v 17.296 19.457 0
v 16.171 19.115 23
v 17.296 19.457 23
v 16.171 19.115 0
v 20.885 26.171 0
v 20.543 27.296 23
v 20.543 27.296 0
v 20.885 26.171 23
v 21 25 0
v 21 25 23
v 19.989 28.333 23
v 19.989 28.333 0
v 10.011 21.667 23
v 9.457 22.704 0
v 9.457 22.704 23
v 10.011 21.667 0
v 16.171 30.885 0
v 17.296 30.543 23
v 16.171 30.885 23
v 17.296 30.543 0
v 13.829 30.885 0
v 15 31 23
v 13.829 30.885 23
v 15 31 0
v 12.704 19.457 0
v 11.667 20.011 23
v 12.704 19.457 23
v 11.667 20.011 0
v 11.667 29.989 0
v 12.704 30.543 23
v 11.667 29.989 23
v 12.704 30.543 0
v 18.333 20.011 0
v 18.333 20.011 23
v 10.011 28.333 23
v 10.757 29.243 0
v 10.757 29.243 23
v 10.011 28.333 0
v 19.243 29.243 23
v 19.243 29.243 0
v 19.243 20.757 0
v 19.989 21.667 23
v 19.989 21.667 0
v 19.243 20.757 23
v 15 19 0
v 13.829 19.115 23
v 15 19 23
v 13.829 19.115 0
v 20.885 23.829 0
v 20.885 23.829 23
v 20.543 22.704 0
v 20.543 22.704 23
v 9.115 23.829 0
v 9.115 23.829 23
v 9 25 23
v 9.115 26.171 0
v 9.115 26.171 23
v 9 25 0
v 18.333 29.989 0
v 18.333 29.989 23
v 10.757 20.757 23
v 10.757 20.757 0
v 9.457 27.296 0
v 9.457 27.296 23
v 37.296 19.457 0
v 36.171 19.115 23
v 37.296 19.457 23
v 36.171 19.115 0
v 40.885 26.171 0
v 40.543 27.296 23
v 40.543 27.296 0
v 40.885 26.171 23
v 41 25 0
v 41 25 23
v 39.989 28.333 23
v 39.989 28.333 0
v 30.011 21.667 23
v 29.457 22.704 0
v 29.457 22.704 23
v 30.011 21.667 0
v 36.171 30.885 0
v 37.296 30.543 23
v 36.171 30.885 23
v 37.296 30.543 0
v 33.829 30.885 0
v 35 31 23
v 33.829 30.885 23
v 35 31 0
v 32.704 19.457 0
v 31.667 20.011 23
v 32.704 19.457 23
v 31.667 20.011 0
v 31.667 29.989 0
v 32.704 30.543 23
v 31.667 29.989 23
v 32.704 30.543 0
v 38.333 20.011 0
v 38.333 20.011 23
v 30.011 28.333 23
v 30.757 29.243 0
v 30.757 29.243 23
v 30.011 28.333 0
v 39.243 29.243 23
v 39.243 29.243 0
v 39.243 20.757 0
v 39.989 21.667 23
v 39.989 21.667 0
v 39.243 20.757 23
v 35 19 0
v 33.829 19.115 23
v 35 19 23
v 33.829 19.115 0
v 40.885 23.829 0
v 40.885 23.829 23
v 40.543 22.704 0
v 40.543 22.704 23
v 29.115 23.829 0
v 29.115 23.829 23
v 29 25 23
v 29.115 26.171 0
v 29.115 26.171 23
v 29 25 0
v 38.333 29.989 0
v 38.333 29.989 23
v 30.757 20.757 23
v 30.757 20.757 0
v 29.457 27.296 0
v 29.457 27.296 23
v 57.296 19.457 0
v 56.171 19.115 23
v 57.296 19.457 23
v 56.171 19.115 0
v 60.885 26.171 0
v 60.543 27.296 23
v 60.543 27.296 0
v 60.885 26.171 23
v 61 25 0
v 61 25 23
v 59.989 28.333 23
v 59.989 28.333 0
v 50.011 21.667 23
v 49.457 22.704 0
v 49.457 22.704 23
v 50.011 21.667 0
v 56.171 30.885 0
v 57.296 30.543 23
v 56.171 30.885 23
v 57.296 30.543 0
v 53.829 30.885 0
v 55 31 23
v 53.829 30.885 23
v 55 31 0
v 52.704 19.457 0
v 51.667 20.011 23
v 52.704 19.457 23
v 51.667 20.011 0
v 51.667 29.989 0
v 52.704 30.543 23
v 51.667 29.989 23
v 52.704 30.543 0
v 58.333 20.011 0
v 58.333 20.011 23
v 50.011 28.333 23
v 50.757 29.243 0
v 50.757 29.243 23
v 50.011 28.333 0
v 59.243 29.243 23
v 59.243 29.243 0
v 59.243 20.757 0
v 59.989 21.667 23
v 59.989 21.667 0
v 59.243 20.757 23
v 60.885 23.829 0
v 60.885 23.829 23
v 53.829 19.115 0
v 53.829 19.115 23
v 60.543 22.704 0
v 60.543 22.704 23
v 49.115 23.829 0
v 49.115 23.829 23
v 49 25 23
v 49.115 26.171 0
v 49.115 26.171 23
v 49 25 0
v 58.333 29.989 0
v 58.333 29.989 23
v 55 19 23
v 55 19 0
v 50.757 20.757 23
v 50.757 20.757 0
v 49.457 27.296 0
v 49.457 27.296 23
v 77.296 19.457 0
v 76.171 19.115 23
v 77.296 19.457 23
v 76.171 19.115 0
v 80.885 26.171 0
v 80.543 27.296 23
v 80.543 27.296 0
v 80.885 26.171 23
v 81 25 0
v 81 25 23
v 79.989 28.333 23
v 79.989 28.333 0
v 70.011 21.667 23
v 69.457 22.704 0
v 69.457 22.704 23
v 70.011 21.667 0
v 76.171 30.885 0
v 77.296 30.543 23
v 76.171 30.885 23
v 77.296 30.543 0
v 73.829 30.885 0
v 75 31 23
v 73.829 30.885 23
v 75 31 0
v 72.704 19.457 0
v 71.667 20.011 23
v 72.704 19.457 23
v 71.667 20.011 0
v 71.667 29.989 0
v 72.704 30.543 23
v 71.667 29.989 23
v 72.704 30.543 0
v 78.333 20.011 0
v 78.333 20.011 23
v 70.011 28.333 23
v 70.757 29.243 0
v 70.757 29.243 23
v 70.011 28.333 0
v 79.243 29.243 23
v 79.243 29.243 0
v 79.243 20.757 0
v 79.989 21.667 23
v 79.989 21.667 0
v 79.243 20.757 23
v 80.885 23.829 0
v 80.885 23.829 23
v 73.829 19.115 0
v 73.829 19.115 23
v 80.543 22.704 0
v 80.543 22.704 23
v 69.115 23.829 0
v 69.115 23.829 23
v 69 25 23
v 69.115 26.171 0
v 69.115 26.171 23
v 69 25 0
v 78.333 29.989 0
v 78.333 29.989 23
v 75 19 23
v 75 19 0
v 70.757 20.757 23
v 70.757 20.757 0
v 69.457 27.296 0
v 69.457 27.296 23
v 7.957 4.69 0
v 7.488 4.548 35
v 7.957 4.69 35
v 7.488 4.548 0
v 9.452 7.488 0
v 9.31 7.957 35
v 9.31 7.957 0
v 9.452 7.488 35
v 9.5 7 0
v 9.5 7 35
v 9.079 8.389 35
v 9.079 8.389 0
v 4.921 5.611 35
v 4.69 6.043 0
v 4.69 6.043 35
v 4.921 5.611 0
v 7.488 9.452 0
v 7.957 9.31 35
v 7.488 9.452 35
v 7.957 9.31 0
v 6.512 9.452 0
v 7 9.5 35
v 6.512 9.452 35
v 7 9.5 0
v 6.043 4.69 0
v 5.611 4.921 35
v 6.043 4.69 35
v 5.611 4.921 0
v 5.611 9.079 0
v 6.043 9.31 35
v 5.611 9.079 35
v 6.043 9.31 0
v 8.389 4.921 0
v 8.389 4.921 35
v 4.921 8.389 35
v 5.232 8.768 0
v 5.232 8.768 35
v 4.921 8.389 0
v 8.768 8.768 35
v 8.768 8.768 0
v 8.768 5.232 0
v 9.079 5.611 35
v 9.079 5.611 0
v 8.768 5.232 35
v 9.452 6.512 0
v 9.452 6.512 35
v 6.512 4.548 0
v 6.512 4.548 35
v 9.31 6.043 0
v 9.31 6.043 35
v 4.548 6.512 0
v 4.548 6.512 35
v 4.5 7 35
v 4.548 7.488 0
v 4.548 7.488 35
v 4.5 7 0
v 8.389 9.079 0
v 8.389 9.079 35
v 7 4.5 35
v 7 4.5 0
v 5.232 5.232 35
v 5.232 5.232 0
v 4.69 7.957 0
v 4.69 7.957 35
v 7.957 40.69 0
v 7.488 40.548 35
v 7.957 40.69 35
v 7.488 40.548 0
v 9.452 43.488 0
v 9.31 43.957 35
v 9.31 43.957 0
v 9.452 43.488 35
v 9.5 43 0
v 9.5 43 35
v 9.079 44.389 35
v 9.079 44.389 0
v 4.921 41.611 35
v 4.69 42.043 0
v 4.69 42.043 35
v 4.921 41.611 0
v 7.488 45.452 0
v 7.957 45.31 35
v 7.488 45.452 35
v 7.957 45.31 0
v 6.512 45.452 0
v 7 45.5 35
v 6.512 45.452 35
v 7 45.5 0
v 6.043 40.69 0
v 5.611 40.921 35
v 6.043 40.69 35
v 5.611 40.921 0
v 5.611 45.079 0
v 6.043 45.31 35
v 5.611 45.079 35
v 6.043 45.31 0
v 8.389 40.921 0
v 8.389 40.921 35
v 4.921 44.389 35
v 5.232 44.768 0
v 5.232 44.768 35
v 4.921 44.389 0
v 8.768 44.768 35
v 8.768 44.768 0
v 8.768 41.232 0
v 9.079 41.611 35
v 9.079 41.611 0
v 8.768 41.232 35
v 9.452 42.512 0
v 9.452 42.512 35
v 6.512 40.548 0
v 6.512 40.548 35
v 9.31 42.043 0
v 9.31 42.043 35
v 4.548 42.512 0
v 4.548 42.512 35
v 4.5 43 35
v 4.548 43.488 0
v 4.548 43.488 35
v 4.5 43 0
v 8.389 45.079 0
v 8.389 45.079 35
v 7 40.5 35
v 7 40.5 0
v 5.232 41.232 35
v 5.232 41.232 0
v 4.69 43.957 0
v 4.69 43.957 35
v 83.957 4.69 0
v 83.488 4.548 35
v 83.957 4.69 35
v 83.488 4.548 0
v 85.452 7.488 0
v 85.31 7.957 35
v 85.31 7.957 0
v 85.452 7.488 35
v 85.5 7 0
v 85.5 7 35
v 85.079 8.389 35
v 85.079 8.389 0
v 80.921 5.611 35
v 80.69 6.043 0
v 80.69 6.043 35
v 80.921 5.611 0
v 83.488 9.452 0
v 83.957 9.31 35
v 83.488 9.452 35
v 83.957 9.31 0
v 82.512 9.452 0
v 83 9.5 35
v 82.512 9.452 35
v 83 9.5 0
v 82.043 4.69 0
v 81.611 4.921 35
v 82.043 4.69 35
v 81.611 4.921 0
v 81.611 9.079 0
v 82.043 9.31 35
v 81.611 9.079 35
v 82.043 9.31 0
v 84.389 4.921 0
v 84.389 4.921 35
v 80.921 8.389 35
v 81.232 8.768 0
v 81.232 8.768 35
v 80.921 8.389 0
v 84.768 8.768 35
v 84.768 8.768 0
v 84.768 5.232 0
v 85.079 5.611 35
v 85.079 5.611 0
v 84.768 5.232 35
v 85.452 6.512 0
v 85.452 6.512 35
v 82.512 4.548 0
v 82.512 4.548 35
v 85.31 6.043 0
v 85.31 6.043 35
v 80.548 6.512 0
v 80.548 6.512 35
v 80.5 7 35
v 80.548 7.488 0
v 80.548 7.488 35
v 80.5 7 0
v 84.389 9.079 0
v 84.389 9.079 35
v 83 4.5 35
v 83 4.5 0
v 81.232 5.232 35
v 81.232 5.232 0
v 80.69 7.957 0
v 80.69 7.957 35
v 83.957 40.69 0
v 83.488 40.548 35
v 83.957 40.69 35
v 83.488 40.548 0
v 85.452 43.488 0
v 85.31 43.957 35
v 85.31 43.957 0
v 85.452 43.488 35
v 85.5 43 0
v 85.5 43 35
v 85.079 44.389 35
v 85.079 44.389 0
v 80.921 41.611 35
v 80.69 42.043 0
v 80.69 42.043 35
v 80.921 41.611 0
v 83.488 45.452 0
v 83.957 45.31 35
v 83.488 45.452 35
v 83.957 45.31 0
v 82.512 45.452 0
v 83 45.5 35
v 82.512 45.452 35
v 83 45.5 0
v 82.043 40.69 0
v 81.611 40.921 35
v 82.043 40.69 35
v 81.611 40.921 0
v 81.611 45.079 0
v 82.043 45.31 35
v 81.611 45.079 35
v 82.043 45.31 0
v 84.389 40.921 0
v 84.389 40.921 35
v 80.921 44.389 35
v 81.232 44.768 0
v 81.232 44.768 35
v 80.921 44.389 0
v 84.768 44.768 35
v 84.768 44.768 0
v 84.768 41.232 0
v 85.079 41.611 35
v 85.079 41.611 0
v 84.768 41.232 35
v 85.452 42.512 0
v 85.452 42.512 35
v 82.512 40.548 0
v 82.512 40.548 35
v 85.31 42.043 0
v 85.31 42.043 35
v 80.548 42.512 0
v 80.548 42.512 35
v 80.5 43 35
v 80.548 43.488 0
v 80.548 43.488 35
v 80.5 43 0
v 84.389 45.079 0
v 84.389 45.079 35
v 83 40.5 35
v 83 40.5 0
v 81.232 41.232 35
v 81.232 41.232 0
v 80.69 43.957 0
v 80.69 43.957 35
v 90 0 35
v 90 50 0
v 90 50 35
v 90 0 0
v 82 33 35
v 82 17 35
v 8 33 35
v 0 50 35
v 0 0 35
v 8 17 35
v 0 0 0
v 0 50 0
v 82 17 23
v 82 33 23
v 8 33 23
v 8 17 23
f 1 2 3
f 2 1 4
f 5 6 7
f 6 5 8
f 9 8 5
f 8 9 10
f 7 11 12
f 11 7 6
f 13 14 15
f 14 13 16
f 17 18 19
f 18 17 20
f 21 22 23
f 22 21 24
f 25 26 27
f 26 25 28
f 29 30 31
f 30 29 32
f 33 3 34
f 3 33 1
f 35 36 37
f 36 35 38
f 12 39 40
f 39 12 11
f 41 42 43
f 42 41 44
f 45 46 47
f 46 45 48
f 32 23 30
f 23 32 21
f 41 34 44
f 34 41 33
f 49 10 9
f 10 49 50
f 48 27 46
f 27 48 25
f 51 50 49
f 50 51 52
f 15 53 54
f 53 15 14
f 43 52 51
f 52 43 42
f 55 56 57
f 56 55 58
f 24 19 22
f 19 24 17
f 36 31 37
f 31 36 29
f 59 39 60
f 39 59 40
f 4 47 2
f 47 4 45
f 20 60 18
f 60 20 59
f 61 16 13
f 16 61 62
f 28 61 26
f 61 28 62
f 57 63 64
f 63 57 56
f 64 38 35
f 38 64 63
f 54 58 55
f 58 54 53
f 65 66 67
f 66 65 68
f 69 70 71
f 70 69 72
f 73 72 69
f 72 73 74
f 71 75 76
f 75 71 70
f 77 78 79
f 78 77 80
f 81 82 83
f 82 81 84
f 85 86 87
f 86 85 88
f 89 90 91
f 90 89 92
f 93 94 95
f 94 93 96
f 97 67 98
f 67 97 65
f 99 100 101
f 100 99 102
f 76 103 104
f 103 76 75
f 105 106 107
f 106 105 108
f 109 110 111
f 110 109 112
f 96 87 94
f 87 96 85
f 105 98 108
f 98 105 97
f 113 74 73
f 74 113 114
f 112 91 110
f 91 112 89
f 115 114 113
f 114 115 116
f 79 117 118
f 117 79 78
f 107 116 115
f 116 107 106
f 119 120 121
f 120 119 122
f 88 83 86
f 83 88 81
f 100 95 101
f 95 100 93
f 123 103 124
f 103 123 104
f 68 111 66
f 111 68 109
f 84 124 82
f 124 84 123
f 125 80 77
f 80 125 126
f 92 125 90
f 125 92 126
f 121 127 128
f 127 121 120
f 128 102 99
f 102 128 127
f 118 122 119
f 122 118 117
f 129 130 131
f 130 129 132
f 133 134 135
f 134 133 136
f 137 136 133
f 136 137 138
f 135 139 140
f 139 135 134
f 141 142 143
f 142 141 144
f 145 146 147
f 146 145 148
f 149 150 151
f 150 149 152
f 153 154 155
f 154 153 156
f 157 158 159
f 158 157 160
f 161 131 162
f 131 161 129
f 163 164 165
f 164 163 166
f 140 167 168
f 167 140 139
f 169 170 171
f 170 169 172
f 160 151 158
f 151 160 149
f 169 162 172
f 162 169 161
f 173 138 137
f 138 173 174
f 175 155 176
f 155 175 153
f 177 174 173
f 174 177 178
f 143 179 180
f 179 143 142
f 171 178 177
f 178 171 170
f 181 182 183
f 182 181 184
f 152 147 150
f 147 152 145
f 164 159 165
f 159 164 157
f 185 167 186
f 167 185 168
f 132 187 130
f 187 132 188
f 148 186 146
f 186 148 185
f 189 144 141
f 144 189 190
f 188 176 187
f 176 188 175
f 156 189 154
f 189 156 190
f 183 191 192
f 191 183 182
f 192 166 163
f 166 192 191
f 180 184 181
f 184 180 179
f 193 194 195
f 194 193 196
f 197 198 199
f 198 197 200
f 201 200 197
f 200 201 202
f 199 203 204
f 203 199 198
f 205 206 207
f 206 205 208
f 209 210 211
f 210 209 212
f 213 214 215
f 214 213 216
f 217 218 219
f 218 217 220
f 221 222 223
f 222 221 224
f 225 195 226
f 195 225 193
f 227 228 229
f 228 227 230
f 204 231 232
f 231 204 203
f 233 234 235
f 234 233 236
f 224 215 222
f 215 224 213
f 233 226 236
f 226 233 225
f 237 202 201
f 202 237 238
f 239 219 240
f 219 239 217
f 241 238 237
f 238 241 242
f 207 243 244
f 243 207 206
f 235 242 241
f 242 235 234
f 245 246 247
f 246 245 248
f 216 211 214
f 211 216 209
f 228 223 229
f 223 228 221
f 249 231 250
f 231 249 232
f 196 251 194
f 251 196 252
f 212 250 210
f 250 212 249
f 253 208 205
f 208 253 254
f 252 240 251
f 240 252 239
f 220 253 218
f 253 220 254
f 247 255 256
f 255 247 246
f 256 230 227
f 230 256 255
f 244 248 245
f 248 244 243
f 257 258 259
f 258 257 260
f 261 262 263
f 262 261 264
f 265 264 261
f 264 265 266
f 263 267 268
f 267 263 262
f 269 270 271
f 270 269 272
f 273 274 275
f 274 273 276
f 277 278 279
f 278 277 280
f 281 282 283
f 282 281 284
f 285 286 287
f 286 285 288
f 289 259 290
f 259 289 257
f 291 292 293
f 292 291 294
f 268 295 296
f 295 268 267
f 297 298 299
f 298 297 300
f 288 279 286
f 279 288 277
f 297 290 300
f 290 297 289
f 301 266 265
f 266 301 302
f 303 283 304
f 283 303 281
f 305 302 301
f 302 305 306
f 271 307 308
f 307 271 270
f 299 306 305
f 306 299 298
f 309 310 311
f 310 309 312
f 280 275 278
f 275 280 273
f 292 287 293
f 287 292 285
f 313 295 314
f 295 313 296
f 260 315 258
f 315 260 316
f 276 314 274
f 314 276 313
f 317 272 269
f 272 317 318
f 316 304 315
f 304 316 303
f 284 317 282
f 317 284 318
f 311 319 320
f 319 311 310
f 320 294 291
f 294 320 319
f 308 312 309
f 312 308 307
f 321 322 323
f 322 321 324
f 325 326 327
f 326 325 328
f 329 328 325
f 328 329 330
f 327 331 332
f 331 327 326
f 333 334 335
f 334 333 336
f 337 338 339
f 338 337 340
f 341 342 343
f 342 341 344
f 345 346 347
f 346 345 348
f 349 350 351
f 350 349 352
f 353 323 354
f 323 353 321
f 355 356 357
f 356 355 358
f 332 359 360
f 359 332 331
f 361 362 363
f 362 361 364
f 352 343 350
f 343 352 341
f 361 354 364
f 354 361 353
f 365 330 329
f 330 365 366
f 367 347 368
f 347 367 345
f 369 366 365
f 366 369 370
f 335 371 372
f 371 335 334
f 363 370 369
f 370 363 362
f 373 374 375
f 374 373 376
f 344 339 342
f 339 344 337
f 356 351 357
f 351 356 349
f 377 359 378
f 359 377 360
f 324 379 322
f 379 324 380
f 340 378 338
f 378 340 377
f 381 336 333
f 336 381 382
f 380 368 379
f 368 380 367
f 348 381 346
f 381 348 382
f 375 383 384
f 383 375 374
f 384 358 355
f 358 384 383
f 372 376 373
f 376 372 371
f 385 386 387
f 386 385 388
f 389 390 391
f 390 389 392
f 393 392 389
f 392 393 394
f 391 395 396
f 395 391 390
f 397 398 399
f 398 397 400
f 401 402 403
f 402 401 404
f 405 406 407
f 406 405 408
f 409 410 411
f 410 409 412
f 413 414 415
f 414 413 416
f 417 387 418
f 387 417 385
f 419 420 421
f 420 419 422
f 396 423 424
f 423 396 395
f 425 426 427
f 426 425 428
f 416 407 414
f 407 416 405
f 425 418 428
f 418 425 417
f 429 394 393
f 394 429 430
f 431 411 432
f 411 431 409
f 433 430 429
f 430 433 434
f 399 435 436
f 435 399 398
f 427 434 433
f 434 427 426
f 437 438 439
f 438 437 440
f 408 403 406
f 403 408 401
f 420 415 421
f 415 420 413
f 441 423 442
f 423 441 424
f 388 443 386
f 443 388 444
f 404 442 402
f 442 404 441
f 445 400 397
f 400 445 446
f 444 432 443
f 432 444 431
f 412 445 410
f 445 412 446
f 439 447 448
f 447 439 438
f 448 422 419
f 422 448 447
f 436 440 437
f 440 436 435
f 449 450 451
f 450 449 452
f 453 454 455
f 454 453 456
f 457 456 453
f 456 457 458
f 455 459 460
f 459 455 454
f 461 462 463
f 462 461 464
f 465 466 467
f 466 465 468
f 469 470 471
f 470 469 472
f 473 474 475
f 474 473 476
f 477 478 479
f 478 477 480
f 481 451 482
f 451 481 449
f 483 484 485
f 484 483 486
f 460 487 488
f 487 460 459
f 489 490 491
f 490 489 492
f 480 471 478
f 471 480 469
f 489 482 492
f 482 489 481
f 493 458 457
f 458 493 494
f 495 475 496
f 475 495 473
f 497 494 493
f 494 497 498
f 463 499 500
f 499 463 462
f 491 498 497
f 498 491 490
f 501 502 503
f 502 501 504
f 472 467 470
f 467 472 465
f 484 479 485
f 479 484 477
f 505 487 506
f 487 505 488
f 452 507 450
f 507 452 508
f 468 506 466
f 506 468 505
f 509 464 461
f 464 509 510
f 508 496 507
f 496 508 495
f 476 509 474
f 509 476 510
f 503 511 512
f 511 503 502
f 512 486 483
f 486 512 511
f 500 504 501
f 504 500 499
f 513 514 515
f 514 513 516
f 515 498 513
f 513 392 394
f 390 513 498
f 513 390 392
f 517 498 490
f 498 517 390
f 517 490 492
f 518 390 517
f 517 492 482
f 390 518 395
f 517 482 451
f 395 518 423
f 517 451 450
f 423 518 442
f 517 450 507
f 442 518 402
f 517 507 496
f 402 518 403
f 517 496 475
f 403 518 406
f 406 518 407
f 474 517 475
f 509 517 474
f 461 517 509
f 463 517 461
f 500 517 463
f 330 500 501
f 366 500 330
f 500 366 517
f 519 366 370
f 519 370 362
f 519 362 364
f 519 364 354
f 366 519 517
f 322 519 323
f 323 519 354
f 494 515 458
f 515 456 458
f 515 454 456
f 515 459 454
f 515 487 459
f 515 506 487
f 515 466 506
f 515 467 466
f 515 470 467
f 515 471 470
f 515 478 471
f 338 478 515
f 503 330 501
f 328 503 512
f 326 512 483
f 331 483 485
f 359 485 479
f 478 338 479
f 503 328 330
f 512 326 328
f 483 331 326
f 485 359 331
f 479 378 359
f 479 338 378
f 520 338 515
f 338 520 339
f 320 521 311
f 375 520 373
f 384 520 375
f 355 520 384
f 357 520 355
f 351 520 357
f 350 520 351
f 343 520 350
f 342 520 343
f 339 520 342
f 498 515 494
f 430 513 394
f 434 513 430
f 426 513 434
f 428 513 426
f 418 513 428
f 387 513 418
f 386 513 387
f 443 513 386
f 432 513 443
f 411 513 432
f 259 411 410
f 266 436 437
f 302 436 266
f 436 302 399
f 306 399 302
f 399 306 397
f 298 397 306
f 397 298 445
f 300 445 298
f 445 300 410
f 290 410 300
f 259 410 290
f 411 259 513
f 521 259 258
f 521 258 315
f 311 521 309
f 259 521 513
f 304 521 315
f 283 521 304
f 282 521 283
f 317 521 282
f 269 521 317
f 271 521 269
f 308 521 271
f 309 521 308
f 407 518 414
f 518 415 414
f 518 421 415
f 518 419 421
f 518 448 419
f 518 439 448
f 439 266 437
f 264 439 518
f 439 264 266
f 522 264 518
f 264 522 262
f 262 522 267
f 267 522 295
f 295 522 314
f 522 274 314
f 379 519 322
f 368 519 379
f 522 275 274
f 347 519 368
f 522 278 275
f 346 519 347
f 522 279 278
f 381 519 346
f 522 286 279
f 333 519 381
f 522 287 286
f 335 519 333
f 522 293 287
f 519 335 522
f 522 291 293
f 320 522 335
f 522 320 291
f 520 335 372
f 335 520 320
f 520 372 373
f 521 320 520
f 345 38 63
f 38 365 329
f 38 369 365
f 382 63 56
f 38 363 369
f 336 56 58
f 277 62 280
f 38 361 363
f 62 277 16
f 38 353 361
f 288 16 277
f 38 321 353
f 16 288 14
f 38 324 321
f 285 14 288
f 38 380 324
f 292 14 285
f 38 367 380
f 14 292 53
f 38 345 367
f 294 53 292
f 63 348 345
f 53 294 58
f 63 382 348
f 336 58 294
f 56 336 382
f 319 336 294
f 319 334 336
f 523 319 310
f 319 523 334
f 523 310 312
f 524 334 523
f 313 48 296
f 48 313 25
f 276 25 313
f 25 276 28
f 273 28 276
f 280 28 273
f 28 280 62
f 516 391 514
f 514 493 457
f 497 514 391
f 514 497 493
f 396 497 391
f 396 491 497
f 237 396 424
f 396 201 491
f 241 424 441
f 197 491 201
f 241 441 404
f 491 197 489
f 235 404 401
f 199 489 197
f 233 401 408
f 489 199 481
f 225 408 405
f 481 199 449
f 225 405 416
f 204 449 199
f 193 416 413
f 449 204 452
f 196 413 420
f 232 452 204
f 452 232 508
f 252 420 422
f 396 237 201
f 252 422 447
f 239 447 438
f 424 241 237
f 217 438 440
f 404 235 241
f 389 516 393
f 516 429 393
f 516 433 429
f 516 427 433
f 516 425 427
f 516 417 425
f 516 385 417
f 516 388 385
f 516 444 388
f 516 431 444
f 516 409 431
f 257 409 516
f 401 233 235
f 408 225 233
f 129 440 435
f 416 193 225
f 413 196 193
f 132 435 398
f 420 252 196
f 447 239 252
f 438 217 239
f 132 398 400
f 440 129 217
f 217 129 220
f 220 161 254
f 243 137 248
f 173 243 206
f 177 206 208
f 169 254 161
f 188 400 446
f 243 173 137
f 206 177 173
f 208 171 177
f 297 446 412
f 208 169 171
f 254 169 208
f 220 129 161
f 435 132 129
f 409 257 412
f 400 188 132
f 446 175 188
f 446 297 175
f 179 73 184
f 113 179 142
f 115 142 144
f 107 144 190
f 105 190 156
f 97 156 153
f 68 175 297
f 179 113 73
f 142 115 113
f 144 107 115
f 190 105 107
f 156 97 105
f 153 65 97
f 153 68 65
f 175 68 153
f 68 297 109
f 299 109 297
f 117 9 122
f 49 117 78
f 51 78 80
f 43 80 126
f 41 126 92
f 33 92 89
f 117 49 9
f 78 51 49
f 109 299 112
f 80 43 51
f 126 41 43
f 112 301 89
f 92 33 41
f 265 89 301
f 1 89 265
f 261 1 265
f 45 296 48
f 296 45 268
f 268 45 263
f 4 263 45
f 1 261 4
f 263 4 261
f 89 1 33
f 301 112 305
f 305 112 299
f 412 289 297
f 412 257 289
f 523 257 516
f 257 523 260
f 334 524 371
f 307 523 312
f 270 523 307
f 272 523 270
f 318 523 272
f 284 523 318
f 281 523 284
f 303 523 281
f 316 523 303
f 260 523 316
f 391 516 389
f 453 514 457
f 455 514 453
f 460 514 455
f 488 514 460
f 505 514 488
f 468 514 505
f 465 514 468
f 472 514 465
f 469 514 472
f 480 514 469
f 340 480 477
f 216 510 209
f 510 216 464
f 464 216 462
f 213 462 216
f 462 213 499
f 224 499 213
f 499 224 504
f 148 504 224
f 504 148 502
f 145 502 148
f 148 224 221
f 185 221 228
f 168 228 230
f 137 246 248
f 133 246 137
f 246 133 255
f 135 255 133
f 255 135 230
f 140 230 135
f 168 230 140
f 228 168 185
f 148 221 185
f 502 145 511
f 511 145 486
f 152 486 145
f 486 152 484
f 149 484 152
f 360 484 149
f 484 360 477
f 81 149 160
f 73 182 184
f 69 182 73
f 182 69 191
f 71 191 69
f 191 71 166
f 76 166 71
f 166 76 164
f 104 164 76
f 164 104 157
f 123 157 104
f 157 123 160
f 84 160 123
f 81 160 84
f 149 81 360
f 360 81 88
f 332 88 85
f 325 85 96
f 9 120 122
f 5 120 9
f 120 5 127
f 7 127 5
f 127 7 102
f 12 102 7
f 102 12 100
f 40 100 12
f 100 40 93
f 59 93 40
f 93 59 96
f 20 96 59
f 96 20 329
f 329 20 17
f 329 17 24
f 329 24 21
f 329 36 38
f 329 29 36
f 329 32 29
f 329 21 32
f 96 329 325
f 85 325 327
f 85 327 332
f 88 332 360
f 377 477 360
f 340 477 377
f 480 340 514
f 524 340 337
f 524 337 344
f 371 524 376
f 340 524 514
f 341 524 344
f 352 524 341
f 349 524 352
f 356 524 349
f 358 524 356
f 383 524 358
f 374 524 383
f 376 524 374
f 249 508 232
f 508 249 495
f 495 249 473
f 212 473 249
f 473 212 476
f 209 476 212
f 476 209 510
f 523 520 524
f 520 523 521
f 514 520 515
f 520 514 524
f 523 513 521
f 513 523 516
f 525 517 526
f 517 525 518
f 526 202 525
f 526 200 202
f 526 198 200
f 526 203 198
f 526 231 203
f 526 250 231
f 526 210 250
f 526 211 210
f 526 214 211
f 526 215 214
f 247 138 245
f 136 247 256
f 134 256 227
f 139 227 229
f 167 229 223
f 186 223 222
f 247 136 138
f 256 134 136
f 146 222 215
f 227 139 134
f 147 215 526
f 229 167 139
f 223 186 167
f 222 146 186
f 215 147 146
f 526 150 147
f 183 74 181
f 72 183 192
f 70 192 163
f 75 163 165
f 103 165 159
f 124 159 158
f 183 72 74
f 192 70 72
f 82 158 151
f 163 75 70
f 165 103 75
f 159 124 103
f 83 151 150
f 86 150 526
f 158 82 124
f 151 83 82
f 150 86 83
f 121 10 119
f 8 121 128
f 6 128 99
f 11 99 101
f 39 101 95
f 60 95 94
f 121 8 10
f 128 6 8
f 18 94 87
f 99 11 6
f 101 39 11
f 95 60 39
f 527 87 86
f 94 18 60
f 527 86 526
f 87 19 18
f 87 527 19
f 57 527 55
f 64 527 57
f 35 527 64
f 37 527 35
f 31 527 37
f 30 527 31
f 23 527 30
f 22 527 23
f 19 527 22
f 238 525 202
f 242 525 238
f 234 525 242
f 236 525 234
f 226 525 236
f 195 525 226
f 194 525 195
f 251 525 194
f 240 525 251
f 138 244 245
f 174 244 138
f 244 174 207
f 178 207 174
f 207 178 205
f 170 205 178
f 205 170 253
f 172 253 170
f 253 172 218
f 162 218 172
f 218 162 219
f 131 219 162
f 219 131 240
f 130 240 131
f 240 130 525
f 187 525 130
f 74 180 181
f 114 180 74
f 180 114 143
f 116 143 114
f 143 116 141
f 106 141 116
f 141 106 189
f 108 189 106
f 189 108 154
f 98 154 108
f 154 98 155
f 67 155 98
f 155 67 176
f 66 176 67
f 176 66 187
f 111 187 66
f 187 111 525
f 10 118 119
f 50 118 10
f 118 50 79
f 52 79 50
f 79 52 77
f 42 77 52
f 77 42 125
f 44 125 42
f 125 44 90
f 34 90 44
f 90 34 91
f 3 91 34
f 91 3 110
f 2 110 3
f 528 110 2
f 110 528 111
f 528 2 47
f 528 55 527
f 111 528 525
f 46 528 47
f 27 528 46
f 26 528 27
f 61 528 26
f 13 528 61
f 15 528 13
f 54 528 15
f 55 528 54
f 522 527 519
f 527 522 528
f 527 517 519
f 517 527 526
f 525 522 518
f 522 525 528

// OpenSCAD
$fn = 32;

// ----------------------------------------------------------------------
// Manifold block: gallery_top manifold
// ----------------------------------------------------------------------

// --- parameters (mm) ---
block_l = 90;             // block length, X
block_w = 50;             // block width, Y
block_h = 35;             // block height, Z
port_d = 12;              // port bore diameter
port_pitch = 20;          // port pitch along X
gallery_d = 16;           // top gallery width, Y
gallery_depth = 12;       // gallery pocket depth
wall_p = 8;               // gallery end wall thickness, X
mnt_d = 5;                // mounting hole diameter
mnt_in = 7;               // mounting hole inset from the edges

n_ports = 4;  // ports in the row
port_x0 = (block_l - (n_ports - 1) * port_pitch) / 2;  // first port X

difference() {
  cube([block_l, block_w, block_h]);
  for (i = [0 : n_ports - 1])
    translate([port_x0 + i * port_pitch, block_w / 2, -1])
      cylinder(h = block_h + 2, d = port_d);
  translate([wall_p, block_w / 2 - gallery_d / 2, block_h - gallery_depth])
    cube([block_l - 2 * wall_p, gallery_d, gallery_depth + 1]);
  for (cx = [mnt_in, block_l - mnt_in])
    for (cy = [mnt_in, block_w - mnt_in])
      translate([cx, cy, -1]) cylinder(h = block_h + 2, d = mnt_d);
}
